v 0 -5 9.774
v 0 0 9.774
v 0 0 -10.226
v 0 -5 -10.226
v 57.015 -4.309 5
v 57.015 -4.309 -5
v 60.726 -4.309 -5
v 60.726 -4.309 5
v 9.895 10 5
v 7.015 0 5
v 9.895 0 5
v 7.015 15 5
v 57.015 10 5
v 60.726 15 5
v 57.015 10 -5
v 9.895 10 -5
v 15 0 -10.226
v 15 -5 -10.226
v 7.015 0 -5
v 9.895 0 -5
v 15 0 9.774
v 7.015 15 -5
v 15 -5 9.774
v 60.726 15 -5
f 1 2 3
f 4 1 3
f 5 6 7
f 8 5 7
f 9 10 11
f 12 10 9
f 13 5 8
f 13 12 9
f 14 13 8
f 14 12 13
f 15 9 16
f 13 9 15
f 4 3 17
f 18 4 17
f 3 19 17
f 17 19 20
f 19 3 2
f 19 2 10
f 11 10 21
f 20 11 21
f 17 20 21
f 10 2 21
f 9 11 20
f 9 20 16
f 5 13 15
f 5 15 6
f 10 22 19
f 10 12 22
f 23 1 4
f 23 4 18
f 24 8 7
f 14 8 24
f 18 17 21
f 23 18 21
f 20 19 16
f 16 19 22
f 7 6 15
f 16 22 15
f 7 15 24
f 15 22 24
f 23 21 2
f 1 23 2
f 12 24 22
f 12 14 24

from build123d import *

# Parameters (mm, degrees)
F1_DEPTH      = 5
F3_DEPTH      = 5
F3_DEPTH_BACK = 5


# Not quite as in the source:
# - a feature names something its author has since deleted; it is built from what else it names


with BuildPart() as f1:
    # F0 (on Front) → F1 (new body)
    with BuildSketch(Plane.XZ):
        Polygon((0, 9.7736853705), (0, 0), (0, -10.2263146295), (15, -10.2263146295), (15, 9.7736853705), align=None)
    extrude(amount=F1_DEPTH)

    # F2 (on Top) → F3 (join, two sides)
    with BuildSketch(Plane.XY) as f3_sk:
        Polygon((7.0152175973, 15), (7.0152175973, 0), (9.8953448171, 0), (9.8953448171, 10), (57.0152175973, 10), (57.0152175973, -4.3088319683), (60.7257795132, -4.3088319683), (60.7257795132, 15), align=None)
    extrude(amount=F3_DEPTH)
    extrude(f3_sk.sketch, amount=-F3_DEPTH_BACK)


solid = f1.part
